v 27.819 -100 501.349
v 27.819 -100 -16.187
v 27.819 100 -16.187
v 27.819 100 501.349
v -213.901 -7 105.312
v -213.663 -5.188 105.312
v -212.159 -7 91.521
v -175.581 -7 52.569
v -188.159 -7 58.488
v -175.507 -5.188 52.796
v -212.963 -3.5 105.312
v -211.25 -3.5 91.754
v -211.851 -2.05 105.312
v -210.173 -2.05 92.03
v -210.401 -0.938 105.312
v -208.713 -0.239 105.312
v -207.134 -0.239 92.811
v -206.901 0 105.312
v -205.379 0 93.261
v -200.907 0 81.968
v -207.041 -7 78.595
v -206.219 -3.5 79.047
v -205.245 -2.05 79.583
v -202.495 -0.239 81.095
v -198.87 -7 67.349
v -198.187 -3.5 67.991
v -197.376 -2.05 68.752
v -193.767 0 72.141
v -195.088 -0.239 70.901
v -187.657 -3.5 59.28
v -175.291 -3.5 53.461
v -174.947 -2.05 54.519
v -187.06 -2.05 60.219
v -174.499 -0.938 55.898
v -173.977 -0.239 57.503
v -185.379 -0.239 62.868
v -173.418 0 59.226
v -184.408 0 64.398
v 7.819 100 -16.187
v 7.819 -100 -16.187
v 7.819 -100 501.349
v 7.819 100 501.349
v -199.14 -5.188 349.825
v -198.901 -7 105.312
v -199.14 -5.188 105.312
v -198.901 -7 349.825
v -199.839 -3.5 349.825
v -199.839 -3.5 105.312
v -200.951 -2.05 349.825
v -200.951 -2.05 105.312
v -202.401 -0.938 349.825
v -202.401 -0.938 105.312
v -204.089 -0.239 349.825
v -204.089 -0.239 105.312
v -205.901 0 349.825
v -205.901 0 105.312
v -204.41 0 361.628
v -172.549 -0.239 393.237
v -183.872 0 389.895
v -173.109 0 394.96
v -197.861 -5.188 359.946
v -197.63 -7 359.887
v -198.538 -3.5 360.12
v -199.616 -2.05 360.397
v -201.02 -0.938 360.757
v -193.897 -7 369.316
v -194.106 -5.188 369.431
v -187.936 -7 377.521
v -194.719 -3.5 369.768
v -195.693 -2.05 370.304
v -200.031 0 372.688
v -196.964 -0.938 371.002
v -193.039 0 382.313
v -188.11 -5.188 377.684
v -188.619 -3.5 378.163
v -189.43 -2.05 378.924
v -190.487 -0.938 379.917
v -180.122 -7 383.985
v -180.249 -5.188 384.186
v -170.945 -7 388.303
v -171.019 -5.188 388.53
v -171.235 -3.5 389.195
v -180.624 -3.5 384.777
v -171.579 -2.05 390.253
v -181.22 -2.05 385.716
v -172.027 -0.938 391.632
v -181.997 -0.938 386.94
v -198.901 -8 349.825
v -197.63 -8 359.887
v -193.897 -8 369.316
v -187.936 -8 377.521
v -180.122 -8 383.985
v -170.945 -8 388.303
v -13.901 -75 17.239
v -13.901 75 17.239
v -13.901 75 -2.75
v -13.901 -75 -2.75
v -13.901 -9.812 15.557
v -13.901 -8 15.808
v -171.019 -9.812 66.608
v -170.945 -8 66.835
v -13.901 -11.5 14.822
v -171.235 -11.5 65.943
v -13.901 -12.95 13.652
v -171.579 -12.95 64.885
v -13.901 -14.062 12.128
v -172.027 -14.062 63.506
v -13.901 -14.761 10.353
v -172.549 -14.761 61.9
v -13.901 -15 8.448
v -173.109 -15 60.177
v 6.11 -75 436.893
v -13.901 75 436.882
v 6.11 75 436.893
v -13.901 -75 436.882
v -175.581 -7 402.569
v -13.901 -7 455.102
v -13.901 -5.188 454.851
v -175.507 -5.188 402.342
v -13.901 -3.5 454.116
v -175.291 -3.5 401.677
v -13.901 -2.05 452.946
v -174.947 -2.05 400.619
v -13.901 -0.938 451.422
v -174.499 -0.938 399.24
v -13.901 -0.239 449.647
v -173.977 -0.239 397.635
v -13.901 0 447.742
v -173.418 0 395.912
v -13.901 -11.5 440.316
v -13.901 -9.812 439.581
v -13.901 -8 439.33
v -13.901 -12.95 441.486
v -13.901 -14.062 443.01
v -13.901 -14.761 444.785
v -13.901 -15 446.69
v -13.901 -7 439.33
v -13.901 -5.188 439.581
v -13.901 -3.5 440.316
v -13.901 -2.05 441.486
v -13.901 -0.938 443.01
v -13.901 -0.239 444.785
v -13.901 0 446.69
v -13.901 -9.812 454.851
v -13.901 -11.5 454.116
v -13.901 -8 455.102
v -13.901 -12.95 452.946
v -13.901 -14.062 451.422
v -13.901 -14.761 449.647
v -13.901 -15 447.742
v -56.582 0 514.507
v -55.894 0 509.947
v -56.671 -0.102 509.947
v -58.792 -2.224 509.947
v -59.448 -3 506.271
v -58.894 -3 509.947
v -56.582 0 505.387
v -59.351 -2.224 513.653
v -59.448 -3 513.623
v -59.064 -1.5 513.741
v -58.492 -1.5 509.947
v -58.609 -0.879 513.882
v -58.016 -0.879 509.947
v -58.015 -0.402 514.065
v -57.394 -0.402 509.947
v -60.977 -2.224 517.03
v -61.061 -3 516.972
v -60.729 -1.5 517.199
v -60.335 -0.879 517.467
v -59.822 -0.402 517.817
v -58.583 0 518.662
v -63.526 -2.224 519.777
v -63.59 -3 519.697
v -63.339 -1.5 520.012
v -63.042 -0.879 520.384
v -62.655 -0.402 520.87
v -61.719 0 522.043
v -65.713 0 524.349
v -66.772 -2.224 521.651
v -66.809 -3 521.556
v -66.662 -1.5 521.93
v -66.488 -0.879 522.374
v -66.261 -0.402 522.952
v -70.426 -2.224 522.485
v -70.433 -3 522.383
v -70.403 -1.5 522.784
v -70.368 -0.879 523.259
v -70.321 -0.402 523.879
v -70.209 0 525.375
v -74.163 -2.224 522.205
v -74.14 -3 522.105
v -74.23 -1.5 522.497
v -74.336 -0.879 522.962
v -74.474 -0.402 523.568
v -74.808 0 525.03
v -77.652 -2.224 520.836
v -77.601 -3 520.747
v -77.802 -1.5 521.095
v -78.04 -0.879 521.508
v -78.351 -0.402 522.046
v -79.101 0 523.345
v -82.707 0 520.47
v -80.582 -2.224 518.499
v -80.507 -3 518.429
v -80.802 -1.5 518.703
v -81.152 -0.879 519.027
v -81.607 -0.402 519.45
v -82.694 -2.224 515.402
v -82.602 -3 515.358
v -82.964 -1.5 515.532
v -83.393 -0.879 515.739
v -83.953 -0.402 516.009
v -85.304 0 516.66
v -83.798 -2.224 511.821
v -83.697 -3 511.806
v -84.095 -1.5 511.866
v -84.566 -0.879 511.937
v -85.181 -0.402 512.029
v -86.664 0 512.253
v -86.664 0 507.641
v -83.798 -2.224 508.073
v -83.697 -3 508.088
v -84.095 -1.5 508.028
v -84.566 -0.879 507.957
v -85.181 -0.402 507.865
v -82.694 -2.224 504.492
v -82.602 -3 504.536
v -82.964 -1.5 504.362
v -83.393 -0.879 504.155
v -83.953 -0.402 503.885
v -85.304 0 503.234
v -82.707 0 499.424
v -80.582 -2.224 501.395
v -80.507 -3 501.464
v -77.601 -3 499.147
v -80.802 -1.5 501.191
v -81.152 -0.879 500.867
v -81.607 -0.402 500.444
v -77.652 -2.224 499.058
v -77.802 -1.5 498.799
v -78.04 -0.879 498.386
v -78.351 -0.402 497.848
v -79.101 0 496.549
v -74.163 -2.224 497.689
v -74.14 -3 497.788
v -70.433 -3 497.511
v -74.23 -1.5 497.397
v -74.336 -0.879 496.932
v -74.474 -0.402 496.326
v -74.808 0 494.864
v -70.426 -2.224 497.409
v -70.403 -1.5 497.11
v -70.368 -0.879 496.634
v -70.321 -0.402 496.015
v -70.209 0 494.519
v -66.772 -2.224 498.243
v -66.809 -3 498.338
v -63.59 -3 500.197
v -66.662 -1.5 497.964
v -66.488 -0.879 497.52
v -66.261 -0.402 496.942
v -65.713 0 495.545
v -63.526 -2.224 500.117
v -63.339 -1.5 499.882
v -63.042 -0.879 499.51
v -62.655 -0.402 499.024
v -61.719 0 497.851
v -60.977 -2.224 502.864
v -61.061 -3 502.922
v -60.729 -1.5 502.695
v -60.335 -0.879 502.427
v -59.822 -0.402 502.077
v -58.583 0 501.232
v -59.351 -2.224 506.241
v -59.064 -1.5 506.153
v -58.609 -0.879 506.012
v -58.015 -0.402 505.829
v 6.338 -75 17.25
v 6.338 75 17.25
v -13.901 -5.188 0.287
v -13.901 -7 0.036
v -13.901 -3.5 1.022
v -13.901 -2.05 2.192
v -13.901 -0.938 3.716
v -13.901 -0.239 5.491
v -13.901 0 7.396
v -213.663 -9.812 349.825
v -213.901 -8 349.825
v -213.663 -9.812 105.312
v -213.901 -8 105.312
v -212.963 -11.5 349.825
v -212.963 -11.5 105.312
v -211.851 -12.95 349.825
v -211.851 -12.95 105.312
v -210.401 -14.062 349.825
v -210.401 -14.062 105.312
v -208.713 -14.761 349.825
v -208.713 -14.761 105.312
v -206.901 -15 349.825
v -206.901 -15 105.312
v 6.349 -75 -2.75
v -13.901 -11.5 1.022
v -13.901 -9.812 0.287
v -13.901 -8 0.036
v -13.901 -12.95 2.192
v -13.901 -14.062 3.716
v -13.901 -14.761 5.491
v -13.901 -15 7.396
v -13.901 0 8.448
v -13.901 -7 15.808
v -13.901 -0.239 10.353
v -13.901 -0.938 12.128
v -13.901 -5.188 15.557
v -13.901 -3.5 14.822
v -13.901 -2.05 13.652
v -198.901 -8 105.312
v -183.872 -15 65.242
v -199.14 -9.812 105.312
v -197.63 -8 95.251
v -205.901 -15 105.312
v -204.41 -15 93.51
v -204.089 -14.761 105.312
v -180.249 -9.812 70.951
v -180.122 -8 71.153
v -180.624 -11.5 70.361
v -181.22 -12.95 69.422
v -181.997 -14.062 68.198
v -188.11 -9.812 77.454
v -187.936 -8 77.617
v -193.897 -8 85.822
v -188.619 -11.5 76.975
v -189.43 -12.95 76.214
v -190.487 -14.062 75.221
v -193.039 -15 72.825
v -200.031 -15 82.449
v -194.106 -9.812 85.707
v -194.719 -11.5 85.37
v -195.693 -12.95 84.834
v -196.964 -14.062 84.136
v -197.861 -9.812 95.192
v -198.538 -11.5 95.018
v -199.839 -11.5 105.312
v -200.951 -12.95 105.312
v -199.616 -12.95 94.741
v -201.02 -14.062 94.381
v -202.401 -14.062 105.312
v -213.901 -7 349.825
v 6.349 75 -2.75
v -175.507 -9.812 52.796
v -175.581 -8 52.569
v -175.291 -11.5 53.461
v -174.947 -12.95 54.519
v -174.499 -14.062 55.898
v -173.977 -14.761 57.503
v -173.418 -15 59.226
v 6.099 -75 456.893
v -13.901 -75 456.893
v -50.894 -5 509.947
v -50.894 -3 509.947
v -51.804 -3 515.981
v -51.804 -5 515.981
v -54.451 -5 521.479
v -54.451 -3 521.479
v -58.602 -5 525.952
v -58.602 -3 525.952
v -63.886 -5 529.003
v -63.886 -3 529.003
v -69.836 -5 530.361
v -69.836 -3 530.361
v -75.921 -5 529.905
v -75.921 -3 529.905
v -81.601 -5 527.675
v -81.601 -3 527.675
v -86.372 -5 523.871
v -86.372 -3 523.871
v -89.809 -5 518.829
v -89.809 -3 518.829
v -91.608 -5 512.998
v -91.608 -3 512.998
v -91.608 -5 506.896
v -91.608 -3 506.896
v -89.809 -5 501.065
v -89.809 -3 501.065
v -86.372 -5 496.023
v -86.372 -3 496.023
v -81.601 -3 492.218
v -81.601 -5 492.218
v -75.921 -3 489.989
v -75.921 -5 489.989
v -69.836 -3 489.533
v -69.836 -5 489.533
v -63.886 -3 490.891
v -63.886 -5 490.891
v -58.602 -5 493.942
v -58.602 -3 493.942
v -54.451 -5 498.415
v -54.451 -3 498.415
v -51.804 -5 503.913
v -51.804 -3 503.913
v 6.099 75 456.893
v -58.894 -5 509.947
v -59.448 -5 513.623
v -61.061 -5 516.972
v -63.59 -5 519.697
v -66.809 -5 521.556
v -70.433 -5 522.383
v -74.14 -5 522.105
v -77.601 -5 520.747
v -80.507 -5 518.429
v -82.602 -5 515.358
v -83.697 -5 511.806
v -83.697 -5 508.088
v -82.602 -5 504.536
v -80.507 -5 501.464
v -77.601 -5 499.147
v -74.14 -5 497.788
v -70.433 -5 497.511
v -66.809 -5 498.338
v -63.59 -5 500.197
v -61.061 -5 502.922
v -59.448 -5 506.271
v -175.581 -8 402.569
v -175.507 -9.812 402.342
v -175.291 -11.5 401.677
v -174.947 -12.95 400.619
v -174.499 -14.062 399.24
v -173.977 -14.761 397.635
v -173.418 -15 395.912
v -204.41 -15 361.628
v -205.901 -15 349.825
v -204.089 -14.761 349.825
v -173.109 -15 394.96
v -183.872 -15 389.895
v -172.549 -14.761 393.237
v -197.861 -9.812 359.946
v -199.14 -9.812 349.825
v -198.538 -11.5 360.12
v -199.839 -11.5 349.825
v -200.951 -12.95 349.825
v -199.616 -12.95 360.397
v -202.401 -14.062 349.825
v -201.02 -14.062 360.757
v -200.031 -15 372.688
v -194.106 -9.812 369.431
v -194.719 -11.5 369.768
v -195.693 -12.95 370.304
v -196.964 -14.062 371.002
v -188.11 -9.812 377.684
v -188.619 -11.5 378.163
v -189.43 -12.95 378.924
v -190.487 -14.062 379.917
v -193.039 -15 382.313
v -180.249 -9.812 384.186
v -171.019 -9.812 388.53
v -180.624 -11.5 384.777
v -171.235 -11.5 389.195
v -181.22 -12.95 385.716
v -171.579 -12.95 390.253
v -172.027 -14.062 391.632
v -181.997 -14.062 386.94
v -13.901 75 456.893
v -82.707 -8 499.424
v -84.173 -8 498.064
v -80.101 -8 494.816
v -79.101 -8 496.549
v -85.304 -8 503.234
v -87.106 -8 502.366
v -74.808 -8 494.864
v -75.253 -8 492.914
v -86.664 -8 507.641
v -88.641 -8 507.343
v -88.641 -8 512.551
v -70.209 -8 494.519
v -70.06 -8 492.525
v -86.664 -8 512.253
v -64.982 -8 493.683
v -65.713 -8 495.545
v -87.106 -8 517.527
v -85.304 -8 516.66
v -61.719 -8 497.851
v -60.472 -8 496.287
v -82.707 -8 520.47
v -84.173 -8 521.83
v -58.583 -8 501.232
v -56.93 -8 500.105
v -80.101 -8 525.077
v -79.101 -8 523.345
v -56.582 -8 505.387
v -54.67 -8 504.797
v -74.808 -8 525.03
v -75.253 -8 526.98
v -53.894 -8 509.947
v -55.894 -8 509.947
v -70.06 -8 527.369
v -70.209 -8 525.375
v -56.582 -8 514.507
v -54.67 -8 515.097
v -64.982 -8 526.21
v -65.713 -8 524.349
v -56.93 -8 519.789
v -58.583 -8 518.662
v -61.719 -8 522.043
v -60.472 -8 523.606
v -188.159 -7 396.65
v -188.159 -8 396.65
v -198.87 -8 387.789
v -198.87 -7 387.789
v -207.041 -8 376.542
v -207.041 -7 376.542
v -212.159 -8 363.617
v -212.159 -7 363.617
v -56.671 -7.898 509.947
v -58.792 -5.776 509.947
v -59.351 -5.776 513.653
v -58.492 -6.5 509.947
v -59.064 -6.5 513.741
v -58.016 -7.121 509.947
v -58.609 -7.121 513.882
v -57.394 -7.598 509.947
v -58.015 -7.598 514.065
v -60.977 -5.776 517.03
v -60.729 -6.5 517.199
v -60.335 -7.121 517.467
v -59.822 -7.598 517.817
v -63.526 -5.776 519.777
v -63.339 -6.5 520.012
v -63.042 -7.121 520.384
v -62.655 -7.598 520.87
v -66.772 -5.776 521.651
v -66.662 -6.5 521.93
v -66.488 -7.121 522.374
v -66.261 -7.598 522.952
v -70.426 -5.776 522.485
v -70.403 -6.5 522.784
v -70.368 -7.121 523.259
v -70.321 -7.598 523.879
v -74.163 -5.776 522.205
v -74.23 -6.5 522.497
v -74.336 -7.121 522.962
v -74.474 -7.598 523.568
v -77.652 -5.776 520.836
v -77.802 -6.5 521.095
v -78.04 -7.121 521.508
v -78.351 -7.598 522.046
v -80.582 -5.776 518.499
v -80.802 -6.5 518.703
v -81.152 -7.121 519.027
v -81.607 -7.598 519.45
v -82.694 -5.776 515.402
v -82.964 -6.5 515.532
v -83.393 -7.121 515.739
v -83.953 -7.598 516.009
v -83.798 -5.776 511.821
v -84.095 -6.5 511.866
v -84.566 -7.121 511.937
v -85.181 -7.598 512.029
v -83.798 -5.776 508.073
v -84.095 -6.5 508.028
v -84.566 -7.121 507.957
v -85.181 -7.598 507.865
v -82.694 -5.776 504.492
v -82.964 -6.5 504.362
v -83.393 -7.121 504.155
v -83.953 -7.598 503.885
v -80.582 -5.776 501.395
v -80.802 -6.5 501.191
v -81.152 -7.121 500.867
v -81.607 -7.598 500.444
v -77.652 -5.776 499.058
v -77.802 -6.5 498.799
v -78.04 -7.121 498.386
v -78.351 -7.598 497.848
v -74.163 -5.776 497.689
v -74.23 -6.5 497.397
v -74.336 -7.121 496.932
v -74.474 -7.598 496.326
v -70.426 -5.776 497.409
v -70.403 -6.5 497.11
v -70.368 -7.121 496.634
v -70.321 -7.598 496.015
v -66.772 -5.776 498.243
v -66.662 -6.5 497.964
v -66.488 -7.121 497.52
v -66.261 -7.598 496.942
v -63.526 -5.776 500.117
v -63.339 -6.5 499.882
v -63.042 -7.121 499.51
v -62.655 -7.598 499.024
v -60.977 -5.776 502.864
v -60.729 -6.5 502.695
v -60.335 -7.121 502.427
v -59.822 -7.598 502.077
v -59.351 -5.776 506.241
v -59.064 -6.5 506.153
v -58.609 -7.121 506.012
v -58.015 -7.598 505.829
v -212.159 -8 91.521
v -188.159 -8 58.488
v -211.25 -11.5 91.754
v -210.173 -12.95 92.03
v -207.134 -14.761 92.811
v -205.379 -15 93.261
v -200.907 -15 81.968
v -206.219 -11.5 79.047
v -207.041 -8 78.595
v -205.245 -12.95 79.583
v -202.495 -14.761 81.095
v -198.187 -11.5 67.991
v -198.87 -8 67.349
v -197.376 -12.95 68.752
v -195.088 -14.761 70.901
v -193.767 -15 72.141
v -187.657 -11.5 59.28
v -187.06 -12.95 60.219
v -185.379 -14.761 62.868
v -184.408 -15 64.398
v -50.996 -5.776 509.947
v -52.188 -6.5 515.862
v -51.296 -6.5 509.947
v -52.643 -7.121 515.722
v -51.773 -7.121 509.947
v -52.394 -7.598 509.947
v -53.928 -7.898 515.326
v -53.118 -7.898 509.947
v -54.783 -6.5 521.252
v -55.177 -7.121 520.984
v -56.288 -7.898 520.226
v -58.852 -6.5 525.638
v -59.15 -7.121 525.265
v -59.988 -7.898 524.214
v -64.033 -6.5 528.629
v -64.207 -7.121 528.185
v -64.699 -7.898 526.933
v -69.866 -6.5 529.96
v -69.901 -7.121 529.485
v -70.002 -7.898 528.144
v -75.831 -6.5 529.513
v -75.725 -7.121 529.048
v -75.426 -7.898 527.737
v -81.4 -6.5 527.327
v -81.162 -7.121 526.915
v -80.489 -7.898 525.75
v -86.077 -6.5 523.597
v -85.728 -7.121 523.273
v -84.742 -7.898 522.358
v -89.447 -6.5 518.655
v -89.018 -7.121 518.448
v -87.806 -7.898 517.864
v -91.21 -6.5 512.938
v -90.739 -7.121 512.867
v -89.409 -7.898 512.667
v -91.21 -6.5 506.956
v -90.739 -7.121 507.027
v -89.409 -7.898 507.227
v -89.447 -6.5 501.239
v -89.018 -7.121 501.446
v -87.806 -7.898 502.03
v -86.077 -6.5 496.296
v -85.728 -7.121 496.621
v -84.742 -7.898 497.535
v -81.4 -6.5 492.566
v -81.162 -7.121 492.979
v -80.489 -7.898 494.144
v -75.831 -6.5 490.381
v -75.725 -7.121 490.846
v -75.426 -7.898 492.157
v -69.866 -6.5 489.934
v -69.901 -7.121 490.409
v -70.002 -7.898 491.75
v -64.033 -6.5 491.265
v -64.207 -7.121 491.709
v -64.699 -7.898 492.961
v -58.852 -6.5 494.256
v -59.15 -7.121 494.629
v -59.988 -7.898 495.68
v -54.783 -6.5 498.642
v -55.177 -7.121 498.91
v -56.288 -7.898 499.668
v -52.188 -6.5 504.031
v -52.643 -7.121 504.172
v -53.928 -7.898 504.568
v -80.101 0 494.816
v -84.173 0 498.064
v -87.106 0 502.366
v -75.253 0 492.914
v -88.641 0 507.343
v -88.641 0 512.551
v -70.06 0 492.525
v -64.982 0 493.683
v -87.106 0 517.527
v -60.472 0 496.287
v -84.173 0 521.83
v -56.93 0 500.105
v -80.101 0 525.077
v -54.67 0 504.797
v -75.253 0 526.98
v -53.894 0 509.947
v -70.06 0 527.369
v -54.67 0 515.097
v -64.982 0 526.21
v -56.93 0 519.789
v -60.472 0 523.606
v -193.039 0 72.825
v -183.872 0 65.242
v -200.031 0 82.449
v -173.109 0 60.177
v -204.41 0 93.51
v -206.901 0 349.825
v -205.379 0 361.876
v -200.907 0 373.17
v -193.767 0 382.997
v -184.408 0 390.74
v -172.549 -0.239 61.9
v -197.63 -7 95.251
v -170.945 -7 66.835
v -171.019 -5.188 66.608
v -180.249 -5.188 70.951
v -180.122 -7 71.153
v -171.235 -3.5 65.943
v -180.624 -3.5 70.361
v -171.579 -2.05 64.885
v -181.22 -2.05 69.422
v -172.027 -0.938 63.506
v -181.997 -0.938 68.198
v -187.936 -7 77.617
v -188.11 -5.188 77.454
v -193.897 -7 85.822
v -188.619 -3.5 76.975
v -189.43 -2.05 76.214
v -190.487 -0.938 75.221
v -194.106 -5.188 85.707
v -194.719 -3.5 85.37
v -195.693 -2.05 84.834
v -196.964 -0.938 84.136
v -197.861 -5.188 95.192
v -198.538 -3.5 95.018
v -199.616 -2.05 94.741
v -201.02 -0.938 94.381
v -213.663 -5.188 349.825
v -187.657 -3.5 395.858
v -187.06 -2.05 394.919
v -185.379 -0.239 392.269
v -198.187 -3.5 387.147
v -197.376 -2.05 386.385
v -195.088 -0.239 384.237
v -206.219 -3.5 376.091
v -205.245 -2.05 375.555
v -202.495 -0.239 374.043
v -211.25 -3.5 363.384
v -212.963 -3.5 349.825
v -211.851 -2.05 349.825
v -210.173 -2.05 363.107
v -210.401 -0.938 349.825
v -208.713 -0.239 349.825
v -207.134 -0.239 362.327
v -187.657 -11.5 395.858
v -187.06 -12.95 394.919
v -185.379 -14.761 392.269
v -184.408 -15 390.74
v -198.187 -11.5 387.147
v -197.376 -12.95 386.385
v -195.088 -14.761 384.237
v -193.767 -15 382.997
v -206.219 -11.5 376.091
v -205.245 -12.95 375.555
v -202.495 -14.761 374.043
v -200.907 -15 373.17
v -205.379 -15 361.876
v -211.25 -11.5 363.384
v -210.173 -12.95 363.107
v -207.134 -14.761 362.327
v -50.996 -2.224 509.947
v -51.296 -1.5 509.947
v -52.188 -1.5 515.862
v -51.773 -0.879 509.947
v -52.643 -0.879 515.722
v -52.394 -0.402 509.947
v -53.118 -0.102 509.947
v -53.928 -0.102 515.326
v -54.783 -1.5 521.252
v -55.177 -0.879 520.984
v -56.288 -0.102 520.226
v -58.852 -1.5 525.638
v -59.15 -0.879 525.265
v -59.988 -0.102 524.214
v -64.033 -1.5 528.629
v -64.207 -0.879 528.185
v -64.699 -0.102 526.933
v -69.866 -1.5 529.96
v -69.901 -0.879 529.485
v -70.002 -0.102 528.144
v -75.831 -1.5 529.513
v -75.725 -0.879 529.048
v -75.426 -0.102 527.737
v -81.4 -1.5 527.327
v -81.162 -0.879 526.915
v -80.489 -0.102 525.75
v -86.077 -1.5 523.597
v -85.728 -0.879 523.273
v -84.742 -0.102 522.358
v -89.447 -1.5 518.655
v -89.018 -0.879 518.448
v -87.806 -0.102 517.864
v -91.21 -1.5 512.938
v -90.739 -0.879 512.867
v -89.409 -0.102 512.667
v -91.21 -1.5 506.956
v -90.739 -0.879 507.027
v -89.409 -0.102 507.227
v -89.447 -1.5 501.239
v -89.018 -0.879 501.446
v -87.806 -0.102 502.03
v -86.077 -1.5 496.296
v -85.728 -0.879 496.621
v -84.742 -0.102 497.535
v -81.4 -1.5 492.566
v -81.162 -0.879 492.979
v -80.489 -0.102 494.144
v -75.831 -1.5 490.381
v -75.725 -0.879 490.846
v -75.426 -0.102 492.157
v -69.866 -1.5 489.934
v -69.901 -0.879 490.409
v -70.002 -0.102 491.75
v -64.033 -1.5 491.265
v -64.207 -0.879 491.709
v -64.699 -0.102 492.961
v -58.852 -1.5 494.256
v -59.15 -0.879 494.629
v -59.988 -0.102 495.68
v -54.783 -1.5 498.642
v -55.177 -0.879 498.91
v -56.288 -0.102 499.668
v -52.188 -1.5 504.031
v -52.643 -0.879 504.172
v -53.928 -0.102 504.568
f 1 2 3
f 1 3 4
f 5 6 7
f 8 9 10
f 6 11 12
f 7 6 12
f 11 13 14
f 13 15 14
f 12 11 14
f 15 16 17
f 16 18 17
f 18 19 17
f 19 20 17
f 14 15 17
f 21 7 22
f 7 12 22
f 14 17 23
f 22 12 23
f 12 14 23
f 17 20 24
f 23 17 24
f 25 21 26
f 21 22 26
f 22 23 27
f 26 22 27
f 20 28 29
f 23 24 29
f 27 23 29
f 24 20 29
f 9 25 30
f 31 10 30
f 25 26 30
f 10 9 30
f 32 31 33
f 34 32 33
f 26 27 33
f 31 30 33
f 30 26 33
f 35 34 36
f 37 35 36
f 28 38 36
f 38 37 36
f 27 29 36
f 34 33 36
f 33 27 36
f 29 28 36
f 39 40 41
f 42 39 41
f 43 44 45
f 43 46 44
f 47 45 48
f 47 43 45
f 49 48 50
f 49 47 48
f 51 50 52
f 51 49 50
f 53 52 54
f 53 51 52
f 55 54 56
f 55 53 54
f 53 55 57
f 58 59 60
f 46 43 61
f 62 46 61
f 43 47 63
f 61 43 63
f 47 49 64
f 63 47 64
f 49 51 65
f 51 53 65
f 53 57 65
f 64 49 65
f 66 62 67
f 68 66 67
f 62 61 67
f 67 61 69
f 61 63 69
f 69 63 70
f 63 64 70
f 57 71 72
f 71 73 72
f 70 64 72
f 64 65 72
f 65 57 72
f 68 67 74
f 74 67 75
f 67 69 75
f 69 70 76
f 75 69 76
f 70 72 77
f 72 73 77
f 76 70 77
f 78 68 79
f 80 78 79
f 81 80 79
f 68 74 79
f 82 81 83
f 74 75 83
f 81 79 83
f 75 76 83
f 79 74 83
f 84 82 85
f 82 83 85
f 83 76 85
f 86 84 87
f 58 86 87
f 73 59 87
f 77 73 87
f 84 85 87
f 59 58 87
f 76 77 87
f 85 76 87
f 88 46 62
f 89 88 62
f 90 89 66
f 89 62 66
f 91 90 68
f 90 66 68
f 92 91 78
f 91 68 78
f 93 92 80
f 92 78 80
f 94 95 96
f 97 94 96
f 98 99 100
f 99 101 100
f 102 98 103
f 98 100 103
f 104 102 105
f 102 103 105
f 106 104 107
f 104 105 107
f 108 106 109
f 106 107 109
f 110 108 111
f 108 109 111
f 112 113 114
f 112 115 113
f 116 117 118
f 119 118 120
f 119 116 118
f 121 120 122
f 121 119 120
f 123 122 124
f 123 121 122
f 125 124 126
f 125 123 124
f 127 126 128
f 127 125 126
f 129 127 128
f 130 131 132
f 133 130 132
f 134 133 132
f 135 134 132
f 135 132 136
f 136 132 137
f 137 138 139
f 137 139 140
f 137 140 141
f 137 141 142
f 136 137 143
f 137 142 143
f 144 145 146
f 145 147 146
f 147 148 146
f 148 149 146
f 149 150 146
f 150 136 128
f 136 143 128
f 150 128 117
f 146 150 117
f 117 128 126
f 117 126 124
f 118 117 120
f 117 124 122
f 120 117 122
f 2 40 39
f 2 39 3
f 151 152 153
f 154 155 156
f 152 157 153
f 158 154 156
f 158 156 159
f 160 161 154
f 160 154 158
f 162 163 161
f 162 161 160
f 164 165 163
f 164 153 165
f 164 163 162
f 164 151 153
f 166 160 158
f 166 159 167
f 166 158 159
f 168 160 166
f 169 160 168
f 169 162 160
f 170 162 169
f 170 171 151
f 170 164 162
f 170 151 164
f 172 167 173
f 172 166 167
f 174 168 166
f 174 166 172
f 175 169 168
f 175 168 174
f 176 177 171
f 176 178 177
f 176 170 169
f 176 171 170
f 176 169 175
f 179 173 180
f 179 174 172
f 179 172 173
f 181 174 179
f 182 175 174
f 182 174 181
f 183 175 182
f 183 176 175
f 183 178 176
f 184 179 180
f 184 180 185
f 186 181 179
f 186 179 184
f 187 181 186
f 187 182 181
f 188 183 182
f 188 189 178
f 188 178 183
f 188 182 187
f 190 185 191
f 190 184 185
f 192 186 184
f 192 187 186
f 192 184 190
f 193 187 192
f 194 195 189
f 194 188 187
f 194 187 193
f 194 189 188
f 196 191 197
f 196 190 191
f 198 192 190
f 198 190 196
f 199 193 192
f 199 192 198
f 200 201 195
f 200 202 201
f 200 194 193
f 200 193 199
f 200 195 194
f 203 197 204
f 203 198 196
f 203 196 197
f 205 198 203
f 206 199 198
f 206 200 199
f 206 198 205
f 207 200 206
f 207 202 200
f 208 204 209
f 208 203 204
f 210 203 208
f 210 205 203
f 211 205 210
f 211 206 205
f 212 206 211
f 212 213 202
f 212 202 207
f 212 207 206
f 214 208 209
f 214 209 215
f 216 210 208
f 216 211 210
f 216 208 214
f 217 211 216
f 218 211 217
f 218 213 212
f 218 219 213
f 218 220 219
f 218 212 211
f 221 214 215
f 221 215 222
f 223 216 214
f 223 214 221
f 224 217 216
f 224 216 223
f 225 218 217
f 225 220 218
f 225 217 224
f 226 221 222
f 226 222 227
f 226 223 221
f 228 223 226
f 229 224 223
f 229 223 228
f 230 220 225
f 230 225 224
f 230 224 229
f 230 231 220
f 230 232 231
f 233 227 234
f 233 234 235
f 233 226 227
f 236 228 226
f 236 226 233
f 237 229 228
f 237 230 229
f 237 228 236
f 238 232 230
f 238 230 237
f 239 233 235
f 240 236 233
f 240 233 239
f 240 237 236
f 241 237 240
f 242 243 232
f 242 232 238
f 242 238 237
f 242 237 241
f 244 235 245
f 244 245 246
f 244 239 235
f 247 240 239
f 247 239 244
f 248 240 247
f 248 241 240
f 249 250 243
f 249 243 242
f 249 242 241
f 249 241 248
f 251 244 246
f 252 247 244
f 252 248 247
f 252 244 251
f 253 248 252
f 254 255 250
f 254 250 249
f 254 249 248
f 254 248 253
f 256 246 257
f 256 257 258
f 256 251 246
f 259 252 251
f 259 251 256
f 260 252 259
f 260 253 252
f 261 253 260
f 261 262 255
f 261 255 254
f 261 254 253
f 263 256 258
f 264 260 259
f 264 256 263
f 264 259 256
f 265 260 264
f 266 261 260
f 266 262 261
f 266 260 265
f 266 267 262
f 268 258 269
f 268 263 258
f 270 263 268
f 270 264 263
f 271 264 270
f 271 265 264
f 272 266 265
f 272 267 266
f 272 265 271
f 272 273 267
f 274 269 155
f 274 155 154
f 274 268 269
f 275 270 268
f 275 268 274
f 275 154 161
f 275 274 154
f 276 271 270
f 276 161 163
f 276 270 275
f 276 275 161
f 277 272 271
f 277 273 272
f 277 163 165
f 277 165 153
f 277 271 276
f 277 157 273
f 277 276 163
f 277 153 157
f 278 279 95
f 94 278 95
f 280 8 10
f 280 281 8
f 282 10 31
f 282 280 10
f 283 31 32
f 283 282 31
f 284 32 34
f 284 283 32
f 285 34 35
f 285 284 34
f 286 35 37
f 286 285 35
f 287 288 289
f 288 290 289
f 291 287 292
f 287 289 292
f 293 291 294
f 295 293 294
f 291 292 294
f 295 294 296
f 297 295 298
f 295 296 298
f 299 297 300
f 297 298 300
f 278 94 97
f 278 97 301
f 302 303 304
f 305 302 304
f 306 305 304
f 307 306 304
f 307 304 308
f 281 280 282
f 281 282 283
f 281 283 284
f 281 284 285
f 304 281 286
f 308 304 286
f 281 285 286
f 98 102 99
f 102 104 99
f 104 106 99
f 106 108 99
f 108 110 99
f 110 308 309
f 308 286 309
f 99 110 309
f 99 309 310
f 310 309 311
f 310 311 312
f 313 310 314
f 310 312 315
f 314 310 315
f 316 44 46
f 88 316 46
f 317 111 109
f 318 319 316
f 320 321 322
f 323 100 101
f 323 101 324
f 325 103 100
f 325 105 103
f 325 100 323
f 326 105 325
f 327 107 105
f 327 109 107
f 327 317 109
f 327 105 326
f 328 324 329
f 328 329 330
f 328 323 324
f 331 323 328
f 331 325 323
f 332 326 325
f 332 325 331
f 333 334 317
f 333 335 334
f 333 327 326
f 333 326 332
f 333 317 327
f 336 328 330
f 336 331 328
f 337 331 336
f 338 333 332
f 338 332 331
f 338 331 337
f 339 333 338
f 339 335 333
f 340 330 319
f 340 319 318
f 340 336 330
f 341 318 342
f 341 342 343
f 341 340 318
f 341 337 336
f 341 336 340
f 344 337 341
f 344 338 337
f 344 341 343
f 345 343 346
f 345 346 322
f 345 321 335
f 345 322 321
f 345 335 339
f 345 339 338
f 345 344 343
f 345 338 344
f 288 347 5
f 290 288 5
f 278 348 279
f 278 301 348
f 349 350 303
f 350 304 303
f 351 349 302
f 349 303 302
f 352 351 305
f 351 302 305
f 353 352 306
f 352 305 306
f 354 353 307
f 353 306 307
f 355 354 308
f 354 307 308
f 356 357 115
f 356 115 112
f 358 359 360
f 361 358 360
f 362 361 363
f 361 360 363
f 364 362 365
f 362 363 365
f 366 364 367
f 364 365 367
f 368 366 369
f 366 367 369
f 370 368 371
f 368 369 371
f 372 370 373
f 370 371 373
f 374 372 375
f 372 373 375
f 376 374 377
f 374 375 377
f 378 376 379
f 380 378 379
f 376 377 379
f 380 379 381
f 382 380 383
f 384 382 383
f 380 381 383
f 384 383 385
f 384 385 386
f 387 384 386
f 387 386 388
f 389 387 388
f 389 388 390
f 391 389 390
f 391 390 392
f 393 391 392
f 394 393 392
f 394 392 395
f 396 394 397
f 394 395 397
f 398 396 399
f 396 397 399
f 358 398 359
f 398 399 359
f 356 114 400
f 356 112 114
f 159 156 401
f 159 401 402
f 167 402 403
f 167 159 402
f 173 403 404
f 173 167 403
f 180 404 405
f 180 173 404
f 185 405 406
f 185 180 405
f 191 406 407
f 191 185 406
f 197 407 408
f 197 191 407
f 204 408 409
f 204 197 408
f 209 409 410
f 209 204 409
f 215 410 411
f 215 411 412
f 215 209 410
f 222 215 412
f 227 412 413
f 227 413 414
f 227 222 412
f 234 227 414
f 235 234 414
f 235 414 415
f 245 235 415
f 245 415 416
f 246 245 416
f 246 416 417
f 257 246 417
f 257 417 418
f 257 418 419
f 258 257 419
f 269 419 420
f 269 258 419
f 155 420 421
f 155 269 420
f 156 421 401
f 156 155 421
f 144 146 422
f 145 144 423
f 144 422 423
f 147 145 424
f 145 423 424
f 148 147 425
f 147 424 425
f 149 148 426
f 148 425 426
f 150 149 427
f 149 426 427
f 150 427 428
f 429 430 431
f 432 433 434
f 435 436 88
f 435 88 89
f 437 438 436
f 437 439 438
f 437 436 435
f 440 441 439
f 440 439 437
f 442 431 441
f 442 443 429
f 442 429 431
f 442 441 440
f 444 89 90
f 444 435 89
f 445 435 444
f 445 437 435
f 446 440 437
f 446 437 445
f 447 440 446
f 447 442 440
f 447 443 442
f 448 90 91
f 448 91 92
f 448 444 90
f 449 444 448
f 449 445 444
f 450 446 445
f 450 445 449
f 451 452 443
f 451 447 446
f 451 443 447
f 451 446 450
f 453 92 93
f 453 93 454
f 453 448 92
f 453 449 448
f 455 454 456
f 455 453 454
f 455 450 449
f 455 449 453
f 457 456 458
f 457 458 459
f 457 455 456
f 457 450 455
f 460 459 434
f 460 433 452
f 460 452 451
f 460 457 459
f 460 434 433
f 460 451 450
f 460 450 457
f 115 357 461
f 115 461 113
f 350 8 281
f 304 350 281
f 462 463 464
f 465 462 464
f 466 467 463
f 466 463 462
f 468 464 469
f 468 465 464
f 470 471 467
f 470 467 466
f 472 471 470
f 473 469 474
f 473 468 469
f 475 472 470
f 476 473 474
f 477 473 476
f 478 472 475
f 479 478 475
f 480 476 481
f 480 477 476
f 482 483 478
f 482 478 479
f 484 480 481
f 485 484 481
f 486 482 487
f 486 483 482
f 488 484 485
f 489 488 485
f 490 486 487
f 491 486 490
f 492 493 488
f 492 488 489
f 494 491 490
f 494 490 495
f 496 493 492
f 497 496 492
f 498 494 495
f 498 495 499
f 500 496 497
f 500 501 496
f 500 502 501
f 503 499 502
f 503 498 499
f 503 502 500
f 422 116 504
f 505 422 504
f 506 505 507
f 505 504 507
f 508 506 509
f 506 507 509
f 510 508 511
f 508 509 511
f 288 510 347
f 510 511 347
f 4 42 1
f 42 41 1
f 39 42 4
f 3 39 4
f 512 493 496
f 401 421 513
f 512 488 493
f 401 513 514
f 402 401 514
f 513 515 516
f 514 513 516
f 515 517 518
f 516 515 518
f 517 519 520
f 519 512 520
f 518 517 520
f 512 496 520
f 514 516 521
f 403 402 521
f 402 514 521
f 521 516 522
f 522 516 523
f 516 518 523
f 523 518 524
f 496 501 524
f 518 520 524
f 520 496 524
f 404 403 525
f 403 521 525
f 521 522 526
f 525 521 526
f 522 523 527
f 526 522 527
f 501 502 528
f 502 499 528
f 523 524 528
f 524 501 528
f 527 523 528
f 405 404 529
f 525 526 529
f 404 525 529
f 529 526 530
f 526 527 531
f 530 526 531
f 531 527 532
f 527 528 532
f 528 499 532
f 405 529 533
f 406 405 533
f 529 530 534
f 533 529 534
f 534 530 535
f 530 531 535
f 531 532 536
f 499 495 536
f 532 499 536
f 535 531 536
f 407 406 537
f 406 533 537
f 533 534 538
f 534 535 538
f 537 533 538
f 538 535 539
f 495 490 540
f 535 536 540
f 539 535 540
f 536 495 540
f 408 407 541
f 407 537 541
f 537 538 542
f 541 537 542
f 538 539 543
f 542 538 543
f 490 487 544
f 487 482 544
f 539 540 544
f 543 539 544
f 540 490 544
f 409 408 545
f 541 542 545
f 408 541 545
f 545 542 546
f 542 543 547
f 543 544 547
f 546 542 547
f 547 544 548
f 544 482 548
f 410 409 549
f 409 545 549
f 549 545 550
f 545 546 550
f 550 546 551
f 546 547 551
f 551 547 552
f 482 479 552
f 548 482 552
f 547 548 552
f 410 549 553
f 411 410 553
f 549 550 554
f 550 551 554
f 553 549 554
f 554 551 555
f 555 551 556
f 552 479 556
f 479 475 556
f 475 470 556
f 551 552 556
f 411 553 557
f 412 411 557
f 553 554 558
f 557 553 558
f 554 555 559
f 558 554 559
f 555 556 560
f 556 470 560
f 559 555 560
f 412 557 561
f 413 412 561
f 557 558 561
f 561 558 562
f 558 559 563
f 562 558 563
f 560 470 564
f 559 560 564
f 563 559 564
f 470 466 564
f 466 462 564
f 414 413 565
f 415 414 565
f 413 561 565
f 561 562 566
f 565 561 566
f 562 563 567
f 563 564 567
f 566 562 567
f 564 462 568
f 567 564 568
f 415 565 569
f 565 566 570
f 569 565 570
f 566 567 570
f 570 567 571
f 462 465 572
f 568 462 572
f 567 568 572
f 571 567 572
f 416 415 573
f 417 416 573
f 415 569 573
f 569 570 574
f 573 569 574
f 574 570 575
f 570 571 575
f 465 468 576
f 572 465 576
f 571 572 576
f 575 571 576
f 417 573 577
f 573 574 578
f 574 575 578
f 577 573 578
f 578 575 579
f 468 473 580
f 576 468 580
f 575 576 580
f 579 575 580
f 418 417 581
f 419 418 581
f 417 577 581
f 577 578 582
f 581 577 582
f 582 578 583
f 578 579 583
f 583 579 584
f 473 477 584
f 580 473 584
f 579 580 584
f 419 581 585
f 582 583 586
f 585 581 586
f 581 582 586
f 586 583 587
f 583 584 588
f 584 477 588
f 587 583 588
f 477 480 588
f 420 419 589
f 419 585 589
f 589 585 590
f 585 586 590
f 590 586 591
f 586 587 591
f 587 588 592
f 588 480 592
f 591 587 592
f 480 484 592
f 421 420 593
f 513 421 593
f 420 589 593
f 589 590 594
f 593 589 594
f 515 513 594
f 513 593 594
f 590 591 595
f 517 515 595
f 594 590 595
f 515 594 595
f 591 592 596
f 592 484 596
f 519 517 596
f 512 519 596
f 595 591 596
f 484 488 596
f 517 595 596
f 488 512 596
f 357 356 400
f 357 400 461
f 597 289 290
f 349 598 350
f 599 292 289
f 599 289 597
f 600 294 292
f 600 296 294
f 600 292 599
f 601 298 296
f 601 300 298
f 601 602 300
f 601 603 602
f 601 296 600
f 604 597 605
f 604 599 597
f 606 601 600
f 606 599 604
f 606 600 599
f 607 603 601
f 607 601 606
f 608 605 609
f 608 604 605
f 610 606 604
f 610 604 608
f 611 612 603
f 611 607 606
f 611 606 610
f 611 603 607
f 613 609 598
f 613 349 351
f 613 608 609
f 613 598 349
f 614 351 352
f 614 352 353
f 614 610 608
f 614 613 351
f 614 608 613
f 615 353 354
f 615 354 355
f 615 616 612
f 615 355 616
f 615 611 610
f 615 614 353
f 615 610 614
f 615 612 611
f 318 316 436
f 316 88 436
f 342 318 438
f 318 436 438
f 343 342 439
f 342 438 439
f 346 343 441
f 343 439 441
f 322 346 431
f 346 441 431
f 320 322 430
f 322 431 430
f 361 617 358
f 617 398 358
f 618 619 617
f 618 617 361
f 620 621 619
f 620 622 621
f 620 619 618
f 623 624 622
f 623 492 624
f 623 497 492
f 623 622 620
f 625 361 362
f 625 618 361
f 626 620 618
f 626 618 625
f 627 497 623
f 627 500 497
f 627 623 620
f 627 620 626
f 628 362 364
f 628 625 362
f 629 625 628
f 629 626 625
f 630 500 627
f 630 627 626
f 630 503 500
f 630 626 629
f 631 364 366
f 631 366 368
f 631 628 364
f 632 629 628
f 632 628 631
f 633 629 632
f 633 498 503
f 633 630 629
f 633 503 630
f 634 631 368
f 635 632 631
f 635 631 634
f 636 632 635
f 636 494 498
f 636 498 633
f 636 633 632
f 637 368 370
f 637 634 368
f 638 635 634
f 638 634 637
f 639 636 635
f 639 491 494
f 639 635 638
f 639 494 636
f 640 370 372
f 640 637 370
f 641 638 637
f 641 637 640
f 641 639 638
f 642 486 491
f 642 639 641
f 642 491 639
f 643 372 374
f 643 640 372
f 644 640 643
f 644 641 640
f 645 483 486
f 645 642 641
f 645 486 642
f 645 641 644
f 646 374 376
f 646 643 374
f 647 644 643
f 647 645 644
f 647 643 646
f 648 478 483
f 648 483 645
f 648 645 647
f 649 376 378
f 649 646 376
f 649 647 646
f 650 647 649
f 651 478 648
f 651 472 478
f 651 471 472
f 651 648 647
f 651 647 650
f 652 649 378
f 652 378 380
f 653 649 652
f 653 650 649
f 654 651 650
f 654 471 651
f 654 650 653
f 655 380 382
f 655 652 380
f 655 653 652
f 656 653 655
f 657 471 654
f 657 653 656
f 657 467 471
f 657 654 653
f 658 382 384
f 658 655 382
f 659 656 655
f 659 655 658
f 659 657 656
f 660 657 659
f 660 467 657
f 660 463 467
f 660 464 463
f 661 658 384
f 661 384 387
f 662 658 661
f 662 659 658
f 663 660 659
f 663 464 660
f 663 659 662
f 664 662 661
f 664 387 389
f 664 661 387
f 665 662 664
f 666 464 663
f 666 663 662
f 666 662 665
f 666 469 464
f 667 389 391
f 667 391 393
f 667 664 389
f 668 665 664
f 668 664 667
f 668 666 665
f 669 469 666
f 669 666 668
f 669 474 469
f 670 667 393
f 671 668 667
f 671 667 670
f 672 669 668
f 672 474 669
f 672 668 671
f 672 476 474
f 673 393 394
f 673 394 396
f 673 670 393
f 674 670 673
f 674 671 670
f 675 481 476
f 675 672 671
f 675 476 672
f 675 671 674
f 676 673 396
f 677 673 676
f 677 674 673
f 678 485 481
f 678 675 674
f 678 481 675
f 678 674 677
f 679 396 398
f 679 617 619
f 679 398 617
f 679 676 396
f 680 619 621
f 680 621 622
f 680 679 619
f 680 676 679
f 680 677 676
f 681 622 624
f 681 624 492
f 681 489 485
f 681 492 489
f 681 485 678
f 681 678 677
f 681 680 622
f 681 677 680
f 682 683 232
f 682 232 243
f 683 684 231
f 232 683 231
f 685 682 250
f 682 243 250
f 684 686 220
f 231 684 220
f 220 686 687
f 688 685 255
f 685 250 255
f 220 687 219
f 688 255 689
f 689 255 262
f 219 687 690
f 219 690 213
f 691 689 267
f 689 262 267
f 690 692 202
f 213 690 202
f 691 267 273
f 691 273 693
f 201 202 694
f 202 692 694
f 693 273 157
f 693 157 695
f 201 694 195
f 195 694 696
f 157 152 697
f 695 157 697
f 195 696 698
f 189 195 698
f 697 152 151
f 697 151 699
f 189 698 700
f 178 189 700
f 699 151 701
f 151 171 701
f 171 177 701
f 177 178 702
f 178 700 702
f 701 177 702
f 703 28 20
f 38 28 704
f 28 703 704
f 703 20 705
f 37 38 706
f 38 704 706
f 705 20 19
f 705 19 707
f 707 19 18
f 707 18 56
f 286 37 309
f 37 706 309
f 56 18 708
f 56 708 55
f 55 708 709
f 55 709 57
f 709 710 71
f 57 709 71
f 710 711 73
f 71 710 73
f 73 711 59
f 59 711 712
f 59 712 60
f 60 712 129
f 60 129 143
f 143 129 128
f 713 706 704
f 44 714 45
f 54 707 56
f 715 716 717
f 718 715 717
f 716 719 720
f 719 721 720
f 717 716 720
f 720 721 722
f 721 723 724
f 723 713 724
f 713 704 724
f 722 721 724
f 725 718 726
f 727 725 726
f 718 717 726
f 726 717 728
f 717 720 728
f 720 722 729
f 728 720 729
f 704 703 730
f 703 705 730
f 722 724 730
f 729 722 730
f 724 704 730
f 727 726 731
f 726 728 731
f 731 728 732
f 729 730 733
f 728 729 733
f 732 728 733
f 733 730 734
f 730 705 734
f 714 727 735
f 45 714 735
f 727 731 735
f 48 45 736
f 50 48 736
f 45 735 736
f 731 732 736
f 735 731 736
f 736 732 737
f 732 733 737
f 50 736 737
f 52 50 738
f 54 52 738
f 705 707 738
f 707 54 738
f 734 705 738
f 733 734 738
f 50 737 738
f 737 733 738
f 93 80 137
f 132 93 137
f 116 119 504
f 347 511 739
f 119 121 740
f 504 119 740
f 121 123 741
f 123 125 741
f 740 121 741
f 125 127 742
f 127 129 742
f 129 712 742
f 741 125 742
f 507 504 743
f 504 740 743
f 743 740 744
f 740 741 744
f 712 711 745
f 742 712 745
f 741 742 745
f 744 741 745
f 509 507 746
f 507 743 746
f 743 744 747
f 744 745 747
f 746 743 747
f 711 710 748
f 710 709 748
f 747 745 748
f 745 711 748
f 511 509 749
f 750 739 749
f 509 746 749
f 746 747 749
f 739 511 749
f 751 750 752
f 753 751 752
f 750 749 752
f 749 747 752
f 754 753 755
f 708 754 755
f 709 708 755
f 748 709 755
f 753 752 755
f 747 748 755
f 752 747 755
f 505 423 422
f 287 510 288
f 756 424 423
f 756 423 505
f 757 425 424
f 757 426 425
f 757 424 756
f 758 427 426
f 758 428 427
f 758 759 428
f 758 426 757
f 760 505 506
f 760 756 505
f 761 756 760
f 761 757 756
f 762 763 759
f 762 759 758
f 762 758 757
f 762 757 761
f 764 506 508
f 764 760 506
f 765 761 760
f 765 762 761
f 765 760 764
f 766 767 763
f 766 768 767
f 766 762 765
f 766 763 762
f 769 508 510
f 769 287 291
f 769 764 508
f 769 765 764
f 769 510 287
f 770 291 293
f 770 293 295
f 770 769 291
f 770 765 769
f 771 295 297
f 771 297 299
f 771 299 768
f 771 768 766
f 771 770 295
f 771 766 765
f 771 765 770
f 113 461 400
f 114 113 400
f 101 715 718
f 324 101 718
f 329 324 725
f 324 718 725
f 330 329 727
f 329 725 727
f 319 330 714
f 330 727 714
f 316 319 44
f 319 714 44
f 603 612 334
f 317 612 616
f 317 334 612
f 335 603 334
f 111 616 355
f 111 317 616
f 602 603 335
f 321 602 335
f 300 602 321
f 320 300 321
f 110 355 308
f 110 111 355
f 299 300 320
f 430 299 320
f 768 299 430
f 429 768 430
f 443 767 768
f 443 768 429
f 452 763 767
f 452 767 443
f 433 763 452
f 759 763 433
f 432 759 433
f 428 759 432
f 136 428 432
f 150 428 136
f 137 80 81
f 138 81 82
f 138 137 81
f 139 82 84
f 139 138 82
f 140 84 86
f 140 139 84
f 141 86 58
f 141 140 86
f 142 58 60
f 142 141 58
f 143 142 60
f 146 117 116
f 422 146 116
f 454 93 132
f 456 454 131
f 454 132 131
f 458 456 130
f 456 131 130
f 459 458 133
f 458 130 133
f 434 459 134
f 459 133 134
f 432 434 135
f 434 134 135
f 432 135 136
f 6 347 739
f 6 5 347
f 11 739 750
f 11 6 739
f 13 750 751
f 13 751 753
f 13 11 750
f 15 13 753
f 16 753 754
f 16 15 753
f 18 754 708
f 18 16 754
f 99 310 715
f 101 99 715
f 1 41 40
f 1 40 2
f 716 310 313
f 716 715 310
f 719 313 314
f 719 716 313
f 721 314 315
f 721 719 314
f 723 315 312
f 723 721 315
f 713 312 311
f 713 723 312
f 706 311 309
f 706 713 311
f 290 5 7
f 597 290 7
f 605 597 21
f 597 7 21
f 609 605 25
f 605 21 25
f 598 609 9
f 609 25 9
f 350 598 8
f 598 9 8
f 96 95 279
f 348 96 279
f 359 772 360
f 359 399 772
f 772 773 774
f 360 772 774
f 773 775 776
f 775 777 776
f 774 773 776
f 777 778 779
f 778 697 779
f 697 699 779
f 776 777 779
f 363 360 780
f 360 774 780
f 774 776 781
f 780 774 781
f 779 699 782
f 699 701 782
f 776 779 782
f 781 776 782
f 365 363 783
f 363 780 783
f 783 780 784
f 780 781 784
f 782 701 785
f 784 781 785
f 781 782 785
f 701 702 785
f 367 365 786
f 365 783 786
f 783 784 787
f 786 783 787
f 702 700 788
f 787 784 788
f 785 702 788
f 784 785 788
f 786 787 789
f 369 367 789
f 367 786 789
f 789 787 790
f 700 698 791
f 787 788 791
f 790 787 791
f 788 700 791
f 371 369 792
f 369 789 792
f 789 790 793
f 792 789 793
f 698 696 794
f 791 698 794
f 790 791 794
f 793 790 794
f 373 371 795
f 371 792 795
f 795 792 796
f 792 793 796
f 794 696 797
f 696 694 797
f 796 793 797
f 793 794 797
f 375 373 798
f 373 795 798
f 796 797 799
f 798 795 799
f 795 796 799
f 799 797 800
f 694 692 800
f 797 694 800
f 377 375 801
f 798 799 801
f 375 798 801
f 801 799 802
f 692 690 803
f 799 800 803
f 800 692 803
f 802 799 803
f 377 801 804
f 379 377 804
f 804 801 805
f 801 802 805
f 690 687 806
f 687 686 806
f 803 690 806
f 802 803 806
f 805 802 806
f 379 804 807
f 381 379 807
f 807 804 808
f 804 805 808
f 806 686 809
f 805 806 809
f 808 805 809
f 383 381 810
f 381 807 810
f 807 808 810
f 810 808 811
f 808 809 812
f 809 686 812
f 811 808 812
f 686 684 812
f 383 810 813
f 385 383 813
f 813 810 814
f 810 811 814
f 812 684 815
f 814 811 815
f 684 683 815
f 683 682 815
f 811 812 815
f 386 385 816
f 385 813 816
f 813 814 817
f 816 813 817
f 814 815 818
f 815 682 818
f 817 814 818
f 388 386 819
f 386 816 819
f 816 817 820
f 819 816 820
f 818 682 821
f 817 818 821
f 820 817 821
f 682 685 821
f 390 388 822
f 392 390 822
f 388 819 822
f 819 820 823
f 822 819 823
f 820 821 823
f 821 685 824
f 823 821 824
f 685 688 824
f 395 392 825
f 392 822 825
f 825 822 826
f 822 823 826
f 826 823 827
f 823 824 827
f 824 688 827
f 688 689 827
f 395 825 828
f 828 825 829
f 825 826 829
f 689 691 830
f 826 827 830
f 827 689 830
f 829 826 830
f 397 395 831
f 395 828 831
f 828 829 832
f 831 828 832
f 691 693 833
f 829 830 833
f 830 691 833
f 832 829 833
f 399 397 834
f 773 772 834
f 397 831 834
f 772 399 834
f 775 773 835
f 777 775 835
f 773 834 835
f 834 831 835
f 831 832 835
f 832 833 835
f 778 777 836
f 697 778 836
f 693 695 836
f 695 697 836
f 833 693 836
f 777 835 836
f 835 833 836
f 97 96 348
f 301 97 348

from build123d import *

# Parameters (mm, degrees)
F1_DEPTH = 75
F2_DEPTH = 15
F3_R     = 7
F4_R     = 20.4711735864
F4_R_2   = 12.4711735864
F5_DEPTH = 8
F6_R     = 3
F4_W     = 20
F4_H     = 517.5366248004
F7_DEPTH = 100


# Not quite as in the source:
# - a feature names something its author has since deleted; it is built from what else it names


with BuildPart() as f1:
    # F0 (on Front) → F1 (new body, symmetric)
    with BuildSketch(Plane.XZ):
        Polygon((6.3377187523, 17.2496383322), (-13.9010772109, 17.2386454604), (-13.9010772109, 15.8079492705), (-13.9010772109, 0.0360159069), (-13.9010772109, -2.7503587176), (6.3485819185, -2.7503587176), align=None)
    extrude(amount=F1_DEPTH, both=True)


with BuildPart() as f1b:
    # F0 (on Front) → F1, piece 2 (new body, symmetric)
    with BuildSketch(Plane.XZ):
        Polygon((6.1097859569, 436.8929690868), (6.0989227891, 456.8929690868), (-13.9010772109, 456.8929690868), (-13.9010772109, 455.1017939944), (-13.9010772109, 439.3298606308), (-13.9010772109, 436.8821000186), align=None)
    extrude(amount=F1_DEPTH, both=True)


with BuildPart() as f2:
    # F0 (on Front) → F2 (new body)
    with BuildSketch(Plane.XZ):
        with BuildLine():
            Line((-13.9010772109, 439.3298606308), (-13.9010772109, 455.1017939944))
            Line((-13.9010772109, 455.1017939944), (-175.5806849811, 402.5689049507))
            ThreePointArc((-175.5806849811, 402.5689049507), (-203.309581291, 382.4226825268), (-213.9010772109, 349.8254099002))
            Line((-213.9010772109, 349.8254099002), (-213.9010772109, 105.3124000012))
            ThreePointArc((-213.9010772109, 105.3124000012), (-203.309581291, 72.7151273745), (-175.5806849811, 52.5689049507))
            Line((-175.5806849811, 52.5689049507), (-13.9010772109, 0.0360159069))
            Line((-13.9010772109, 0.0360159069), (-13.9010772109, 15.8079492705))
            Line((-13.9010772109, 15.8079492705), (-170.9454300655, 66.8347526951))
            ThreePointArc((-170.9454300655, 66.8347526951), (-191.1743263754, 81.5319061589), (-198.9010772109, 105.3124000012))
            Line((-198.9010772109, 105.3124000012), (-198.9010772109, 349.8254099002))
            ThreePointArc((-198.9010772109, 349.8254099002), (-191.1743263754, 373.6059037424), (-170.9454300655, 388.3030572062))
            Line((-170.9454300655, 388.3030572062), (-13.9010772109, 439.3298606308))
        make_face()
    extrude(amount=F2_DEPTH)

    # F3
    f3_edges = [f2.edges().sort_by_distance(p)[0] for p in [
        (-94.740881, -15, 428.835349),
        (-94.740881, 0, 428.835349),
        (-92.423254, -15, 413.816459),
        (-92.423254, 0, 413.816459),
    ]]
    fillet(f3_edges, radius=F3_R)


with BuildPart() as f5:
    # F4 (on Front) → F5 (new body)
    with BuildSketch(Plane.XZ):
        with Locations((-71.3653936982, 509.9469423294)):
            Circle(F4_R)
        with Locations((-71.3653936982, 509.9469423294)):
            Circle(F4_R_2, mode=Mode.SUBTRACT)
    extrude(amount=F5_DEPTH)

    # F6
    f6_edges = [f5.edges().sort_by_distance(p)[0] for p in [
        (-91.836567, -8, 509.946942),
        (-91.836567, 0, 509.946942),
        (-83.836567, 0, 509.946942),
        (-83.836567, -8, 509.946942),
    ]]
    fillet(f6_edges, radius=F6_R)


with BuildPart() as f7:
    # F4 (on Front) → F7 (new body, symmetric)
    with BuildSketch(Plane.XZ):
        with Locations((17.8187572956, 242.5810175482)):
            Rectangle(F4_W, F4_H)
    extrude(amount=F7_DEPTH, both=True)


solid = Compound([f1.part, f1b.part, f2.part, f5.part, f7.part])
